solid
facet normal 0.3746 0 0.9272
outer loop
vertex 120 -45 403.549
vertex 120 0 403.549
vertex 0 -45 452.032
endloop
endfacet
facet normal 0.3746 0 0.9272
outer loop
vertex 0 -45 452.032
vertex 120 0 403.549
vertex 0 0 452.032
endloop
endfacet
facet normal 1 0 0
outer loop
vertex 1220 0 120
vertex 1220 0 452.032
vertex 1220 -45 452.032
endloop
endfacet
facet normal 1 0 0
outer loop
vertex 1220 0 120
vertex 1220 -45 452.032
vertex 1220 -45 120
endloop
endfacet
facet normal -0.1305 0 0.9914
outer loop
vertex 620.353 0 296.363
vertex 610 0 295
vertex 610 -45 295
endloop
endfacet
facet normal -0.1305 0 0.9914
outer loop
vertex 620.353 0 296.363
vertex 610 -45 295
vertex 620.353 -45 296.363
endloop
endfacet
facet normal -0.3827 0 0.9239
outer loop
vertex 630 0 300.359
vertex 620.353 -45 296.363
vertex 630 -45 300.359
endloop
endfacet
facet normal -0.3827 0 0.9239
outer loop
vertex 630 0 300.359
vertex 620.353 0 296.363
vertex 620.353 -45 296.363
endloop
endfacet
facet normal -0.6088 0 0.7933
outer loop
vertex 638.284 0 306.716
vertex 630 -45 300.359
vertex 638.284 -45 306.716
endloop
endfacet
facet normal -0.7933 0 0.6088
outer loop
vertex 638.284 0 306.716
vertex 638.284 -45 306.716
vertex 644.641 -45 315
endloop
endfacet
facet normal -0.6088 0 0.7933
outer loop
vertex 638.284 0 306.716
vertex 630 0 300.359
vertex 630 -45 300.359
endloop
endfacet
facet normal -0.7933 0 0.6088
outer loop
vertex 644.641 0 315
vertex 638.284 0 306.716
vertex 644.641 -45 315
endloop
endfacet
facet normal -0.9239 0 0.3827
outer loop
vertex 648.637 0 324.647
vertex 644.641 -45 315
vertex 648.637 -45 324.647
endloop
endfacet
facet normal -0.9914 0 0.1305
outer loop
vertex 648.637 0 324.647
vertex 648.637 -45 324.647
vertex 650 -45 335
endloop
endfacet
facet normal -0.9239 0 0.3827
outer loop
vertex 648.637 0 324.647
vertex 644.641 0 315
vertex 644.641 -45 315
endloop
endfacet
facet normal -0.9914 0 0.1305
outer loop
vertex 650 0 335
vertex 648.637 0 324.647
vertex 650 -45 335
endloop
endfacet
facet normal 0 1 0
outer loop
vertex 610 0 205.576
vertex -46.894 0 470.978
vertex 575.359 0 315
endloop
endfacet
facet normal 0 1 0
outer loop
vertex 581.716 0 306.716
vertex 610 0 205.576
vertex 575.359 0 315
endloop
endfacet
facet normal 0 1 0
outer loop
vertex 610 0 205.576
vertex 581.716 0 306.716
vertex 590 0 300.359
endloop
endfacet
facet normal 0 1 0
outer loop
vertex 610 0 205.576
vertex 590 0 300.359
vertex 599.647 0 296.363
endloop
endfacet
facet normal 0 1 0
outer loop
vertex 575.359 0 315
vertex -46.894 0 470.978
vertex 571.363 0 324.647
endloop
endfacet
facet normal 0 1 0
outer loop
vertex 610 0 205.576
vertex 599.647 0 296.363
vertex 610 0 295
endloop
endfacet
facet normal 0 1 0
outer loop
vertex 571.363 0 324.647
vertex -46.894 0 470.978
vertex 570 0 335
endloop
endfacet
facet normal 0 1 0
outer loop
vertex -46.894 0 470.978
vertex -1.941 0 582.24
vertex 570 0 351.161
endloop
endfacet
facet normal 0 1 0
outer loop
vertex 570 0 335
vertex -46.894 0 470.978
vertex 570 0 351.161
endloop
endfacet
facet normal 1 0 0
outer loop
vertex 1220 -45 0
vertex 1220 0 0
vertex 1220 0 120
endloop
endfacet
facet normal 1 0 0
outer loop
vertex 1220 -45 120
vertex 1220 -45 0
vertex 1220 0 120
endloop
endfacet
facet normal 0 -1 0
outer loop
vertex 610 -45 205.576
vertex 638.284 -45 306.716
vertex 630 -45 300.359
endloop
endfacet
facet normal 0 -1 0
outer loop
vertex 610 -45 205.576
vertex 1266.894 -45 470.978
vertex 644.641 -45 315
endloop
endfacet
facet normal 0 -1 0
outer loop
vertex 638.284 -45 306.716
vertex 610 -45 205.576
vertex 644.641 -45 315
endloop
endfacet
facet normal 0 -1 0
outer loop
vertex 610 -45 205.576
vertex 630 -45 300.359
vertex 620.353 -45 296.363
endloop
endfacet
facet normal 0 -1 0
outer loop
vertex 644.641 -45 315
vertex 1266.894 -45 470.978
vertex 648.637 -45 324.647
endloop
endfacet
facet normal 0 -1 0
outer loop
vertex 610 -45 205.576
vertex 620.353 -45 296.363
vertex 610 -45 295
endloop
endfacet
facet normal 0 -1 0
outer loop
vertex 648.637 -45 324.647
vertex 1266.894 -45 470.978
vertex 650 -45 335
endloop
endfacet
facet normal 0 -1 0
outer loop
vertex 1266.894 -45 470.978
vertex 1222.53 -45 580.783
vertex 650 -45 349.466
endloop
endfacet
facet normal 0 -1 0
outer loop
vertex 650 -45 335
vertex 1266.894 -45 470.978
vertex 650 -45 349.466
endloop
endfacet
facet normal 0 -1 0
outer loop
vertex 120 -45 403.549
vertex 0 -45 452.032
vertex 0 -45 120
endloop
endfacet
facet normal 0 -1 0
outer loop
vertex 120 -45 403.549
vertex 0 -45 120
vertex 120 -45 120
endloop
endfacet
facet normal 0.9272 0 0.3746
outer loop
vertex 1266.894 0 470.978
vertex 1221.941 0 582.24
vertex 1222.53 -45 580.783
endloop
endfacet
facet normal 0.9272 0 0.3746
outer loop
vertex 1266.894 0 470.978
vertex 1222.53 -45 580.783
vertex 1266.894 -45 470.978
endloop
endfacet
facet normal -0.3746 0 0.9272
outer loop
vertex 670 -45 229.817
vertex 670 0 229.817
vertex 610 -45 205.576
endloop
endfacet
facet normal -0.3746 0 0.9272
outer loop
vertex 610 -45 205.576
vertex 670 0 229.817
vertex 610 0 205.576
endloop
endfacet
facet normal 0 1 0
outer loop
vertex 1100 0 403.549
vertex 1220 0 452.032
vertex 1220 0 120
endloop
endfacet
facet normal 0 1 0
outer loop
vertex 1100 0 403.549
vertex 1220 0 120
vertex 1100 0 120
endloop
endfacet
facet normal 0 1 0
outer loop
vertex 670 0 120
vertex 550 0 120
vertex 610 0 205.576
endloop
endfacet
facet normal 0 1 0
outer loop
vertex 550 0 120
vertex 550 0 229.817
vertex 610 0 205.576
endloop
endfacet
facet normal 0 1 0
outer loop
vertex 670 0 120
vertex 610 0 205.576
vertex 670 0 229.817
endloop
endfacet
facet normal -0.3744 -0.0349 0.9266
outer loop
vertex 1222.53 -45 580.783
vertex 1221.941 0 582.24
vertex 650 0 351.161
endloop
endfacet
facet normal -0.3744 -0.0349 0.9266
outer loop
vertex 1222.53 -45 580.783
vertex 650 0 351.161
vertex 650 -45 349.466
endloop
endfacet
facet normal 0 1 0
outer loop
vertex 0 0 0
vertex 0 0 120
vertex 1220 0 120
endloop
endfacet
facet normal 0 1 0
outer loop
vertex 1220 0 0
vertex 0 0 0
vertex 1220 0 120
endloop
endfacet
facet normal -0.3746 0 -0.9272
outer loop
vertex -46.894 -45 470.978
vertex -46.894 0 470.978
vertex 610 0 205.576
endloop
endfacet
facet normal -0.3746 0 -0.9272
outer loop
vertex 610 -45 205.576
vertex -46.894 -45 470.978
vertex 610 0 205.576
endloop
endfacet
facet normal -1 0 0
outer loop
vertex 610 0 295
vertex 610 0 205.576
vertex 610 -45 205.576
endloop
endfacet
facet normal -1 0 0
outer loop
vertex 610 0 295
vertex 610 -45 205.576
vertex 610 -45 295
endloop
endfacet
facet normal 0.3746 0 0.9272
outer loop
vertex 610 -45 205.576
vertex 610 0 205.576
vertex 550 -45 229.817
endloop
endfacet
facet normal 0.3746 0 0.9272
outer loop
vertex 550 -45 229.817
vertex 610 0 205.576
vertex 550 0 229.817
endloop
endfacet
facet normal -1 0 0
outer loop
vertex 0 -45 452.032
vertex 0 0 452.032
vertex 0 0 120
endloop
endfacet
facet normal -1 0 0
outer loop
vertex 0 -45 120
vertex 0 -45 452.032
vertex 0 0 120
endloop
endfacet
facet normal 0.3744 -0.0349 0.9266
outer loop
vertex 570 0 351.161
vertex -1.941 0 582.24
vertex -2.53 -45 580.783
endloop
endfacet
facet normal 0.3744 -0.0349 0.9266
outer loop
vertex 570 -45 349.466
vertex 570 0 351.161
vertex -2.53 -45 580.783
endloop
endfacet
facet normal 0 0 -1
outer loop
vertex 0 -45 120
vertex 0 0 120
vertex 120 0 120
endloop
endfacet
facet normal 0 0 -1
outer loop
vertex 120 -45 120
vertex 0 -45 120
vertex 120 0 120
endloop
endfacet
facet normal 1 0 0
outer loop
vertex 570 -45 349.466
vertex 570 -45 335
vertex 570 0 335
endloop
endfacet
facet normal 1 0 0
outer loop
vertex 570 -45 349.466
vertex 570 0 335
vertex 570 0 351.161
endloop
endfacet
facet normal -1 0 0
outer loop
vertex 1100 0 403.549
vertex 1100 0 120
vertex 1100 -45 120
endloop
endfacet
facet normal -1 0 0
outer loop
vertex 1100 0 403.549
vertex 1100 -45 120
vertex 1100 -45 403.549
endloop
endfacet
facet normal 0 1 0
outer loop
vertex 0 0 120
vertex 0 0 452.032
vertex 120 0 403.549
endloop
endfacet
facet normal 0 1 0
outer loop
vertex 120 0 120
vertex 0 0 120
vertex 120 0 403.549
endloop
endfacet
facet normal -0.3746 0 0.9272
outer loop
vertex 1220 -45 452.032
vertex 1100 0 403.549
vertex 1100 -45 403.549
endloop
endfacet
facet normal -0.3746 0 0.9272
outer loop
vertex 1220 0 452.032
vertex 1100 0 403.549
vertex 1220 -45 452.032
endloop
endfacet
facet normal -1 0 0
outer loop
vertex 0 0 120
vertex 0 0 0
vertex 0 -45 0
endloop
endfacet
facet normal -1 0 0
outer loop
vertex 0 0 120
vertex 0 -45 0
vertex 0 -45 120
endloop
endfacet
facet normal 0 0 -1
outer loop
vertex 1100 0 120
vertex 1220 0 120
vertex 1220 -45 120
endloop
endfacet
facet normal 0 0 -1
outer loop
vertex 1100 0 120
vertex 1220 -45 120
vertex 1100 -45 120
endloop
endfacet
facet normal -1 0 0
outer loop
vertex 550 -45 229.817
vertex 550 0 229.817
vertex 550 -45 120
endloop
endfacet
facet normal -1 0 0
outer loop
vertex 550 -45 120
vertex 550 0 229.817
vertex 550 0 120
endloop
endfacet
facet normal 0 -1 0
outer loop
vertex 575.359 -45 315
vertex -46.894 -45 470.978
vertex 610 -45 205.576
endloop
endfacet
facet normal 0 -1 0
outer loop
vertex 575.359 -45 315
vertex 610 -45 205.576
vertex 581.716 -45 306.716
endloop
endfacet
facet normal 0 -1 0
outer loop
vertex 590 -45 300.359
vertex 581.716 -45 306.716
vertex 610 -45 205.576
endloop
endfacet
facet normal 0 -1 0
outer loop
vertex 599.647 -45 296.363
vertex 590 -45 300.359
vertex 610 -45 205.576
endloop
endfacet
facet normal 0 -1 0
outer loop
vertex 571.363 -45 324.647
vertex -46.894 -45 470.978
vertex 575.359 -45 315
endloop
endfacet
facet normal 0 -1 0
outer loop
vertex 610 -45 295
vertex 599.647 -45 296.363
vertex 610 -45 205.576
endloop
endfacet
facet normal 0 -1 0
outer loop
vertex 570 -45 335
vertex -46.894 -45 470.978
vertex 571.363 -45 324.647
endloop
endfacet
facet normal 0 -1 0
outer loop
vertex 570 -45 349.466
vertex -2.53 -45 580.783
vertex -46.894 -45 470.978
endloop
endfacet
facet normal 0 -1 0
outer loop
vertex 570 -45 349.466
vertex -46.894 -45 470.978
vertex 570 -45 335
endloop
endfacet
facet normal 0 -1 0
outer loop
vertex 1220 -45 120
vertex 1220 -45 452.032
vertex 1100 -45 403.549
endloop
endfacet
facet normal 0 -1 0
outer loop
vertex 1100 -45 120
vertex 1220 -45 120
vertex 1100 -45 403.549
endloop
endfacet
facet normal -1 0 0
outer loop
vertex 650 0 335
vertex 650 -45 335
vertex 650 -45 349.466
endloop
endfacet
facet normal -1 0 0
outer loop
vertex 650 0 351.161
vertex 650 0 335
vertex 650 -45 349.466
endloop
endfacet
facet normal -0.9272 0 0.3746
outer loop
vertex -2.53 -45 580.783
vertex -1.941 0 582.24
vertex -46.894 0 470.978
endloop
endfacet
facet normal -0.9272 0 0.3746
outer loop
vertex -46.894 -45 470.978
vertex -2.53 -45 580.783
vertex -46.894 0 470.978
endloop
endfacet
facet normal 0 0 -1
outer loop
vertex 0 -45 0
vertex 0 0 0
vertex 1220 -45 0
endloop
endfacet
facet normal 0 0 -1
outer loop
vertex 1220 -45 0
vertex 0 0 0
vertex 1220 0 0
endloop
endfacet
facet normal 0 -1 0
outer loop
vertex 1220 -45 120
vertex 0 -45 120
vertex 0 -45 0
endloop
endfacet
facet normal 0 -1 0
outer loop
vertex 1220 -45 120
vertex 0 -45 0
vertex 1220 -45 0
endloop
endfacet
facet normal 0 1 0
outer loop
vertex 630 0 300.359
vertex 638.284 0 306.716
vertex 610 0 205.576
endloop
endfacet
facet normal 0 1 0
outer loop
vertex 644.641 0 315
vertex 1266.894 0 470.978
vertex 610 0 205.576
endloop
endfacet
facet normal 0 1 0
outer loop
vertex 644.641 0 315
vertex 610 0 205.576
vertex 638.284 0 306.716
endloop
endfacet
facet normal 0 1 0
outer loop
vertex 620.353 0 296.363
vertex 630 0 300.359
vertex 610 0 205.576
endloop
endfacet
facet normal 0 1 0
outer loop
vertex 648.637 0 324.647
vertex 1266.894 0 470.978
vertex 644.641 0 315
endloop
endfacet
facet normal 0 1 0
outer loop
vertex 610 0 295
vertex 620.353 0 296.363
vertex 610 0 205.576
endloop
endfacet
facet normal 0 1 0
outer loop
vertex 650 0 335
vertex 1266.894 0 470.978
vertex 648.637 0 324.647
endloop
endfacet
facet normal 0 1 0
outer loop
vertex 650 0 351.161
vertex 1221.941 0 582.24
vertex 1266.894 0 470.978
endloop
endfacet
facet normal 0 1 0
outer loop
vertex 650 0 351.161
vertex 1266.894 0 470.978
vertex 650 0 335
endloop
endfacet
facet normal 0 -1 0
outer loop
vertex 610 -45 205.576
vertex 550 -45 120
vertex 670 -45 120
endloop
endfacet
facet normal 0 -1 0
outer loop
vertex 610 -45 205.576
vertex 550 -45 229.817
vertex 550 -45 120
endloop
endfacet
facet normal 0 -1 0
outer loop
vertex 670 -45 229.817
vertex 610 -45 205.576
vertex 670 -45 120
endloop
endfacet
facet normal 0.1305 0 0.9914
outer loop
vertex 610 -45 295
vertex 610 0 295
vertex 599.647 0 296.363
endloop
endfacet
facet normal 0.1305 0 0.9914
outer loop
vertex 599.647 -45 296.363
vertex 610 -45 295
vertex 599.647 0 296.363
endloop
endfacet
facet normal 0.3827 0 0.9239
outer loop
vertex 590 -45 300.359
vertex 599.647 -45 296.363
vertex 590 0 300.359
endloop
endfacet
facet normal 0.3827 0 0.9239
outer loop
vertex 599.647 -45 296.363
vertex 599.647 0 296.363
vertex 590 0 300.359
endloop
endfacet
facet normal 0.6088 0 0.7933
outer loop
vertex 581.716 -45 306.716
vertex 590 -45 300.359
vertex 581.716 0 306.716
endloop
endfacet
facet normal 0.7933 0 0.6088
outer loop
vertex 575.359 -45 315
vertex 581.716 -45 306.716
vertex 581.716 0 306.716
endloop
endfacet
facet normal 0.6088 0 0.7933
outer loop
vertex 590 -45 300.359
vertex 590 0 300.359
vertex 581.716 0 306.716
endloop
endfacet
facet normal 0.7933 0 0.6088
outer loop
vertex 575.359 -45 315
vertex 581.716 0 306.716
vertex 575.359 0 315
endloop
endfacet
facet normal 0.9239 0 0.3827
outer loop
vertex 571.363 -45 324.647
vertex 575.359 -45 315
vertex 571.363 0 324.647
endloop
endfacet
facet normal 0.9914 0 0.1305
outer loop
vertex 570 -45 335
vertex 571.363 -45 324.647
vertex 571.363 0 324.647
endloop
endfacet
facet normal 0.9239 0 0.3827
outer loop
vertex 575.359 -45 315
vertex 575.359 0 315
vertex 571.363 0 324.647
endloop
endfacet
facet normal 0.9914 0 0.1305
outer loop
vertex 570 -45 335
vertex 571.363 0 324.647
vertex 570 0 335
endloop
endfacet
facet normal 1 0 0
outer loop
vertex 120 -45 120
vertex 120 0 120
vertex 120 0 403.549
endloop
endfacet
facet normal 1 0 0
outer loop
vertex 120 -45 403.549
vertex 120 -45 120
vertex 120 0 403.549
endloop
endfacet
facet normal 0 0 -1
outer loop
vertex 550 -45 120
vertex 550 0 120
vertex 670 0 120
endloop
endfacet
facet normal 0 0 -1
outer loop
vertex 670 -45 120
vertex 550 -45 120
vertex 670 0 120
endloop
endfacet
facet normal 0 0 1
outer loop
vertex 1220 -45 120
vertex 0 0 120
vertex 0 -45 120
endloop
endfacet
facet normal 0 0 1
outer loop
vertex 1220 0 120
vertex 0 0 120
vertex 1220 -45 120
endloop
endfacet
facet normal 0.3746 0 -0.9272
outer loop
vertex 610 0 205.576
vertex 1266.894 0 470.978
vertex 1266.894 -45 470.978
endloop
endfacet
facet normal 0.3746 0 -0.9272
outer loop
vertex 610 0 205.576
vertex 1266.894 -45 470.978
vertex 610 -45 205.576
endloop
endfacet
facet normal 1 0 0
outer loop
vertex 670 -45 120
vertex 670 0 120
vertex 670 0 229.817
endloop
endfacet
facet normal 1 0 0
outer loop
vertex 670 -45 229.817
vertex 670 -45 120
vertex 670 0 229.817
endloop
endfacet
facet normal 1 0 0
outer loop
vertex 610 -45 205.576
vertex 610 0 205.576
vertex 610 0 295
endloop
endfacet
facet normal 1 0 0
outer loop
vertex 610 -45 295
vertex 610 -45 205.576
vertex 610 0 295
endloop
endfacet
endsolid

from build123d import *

# Parameters (mm, degrees)
F0_W      = 1220
F0_H      = 120
F1_DEPTH  = 45
F4_DEPTH  = 45
F6_DEPTH  = 1351.0763600801
F8_DEPTH  = 45
F11_DEPTH = 45


with BuildPart() as f1:
    # F0 (on Front) → F1 (new body)
    with BuildSketch(Plane.XZ):
        with Locations((610, 60)):
            Rectangle(F0_W, F0_H)
    extrude(amount=F1_DEPTH)


with BuildPart() as f4:
    # F3 (on Front) → F4 (new body)
    with BuildSketch(Plane.XZ):
        with BuildLine():
            Line((570, 335), (570, 351.1610490334))
            Line((570, 351.1610490334), (-1.9413440141, 582.2403516545))
            Line((-1.9413440141, 582.2403516545), (-46.894135224, 470.9782891065))
            Line((-46.894135224, 470.9782891065), (610, 205.5758308787))
            Line((610, 205.5758308787), (610, 295))
            ThreePointArc((610, 295), (581.7157287525, 306.7157287525), (570, 335))
        make_face()
    extrude(amount=F4_DEPTH)

    # F5 (on face) → F6 (cut, through all)
    with BuildSketch(Plane(origin=(-203.8979819627, 0, 82.3801321078), x_dir=(0, -1, 0), z_dir=(-0.9271838546, 0, 0.3746065934))):
        Polygon((45, 537.5451786365), (45, 539.1166132636), (0, 539.1166132636), align=None)
    extrude(amount=-F6_DEPTH, mode=Mode.SUBTRACT)


with BuildPart() as f8:
    # F7 (on Front) → F8 (new body)
    with BuildSketch(Plane.XZ):
        Polygon((0, 452.0318286381), (0, 120), (120, 120), (120, 403.5486815379), align=None)
    extrude(amount=F8_DEPTH)


with BuildPart() as f9_1:
    # F9: instance of F4
    add(f4.part.mirror(Plane.YZ.offset(610)))


with BuildPart() as f9_2:
    # F9: instance of F8
    add(f8.part.mirror(Plane.YZ.offset(610)))


with BuildPart() as f11:
    # F10 (on Front) → F11 (new body)
    with BuildSketch(Plane.XZ):
        Polygon((550, 120), (670, 120), (670, 229.8174044288), (610, 205.5758308787), (550, 229.8174044288), align=None)
    extrude(amount=F11_DEPTH)


solid = Compound([f1.part, f4.part, f8.part, f9_1.part, f9_2.part, f11.part])
